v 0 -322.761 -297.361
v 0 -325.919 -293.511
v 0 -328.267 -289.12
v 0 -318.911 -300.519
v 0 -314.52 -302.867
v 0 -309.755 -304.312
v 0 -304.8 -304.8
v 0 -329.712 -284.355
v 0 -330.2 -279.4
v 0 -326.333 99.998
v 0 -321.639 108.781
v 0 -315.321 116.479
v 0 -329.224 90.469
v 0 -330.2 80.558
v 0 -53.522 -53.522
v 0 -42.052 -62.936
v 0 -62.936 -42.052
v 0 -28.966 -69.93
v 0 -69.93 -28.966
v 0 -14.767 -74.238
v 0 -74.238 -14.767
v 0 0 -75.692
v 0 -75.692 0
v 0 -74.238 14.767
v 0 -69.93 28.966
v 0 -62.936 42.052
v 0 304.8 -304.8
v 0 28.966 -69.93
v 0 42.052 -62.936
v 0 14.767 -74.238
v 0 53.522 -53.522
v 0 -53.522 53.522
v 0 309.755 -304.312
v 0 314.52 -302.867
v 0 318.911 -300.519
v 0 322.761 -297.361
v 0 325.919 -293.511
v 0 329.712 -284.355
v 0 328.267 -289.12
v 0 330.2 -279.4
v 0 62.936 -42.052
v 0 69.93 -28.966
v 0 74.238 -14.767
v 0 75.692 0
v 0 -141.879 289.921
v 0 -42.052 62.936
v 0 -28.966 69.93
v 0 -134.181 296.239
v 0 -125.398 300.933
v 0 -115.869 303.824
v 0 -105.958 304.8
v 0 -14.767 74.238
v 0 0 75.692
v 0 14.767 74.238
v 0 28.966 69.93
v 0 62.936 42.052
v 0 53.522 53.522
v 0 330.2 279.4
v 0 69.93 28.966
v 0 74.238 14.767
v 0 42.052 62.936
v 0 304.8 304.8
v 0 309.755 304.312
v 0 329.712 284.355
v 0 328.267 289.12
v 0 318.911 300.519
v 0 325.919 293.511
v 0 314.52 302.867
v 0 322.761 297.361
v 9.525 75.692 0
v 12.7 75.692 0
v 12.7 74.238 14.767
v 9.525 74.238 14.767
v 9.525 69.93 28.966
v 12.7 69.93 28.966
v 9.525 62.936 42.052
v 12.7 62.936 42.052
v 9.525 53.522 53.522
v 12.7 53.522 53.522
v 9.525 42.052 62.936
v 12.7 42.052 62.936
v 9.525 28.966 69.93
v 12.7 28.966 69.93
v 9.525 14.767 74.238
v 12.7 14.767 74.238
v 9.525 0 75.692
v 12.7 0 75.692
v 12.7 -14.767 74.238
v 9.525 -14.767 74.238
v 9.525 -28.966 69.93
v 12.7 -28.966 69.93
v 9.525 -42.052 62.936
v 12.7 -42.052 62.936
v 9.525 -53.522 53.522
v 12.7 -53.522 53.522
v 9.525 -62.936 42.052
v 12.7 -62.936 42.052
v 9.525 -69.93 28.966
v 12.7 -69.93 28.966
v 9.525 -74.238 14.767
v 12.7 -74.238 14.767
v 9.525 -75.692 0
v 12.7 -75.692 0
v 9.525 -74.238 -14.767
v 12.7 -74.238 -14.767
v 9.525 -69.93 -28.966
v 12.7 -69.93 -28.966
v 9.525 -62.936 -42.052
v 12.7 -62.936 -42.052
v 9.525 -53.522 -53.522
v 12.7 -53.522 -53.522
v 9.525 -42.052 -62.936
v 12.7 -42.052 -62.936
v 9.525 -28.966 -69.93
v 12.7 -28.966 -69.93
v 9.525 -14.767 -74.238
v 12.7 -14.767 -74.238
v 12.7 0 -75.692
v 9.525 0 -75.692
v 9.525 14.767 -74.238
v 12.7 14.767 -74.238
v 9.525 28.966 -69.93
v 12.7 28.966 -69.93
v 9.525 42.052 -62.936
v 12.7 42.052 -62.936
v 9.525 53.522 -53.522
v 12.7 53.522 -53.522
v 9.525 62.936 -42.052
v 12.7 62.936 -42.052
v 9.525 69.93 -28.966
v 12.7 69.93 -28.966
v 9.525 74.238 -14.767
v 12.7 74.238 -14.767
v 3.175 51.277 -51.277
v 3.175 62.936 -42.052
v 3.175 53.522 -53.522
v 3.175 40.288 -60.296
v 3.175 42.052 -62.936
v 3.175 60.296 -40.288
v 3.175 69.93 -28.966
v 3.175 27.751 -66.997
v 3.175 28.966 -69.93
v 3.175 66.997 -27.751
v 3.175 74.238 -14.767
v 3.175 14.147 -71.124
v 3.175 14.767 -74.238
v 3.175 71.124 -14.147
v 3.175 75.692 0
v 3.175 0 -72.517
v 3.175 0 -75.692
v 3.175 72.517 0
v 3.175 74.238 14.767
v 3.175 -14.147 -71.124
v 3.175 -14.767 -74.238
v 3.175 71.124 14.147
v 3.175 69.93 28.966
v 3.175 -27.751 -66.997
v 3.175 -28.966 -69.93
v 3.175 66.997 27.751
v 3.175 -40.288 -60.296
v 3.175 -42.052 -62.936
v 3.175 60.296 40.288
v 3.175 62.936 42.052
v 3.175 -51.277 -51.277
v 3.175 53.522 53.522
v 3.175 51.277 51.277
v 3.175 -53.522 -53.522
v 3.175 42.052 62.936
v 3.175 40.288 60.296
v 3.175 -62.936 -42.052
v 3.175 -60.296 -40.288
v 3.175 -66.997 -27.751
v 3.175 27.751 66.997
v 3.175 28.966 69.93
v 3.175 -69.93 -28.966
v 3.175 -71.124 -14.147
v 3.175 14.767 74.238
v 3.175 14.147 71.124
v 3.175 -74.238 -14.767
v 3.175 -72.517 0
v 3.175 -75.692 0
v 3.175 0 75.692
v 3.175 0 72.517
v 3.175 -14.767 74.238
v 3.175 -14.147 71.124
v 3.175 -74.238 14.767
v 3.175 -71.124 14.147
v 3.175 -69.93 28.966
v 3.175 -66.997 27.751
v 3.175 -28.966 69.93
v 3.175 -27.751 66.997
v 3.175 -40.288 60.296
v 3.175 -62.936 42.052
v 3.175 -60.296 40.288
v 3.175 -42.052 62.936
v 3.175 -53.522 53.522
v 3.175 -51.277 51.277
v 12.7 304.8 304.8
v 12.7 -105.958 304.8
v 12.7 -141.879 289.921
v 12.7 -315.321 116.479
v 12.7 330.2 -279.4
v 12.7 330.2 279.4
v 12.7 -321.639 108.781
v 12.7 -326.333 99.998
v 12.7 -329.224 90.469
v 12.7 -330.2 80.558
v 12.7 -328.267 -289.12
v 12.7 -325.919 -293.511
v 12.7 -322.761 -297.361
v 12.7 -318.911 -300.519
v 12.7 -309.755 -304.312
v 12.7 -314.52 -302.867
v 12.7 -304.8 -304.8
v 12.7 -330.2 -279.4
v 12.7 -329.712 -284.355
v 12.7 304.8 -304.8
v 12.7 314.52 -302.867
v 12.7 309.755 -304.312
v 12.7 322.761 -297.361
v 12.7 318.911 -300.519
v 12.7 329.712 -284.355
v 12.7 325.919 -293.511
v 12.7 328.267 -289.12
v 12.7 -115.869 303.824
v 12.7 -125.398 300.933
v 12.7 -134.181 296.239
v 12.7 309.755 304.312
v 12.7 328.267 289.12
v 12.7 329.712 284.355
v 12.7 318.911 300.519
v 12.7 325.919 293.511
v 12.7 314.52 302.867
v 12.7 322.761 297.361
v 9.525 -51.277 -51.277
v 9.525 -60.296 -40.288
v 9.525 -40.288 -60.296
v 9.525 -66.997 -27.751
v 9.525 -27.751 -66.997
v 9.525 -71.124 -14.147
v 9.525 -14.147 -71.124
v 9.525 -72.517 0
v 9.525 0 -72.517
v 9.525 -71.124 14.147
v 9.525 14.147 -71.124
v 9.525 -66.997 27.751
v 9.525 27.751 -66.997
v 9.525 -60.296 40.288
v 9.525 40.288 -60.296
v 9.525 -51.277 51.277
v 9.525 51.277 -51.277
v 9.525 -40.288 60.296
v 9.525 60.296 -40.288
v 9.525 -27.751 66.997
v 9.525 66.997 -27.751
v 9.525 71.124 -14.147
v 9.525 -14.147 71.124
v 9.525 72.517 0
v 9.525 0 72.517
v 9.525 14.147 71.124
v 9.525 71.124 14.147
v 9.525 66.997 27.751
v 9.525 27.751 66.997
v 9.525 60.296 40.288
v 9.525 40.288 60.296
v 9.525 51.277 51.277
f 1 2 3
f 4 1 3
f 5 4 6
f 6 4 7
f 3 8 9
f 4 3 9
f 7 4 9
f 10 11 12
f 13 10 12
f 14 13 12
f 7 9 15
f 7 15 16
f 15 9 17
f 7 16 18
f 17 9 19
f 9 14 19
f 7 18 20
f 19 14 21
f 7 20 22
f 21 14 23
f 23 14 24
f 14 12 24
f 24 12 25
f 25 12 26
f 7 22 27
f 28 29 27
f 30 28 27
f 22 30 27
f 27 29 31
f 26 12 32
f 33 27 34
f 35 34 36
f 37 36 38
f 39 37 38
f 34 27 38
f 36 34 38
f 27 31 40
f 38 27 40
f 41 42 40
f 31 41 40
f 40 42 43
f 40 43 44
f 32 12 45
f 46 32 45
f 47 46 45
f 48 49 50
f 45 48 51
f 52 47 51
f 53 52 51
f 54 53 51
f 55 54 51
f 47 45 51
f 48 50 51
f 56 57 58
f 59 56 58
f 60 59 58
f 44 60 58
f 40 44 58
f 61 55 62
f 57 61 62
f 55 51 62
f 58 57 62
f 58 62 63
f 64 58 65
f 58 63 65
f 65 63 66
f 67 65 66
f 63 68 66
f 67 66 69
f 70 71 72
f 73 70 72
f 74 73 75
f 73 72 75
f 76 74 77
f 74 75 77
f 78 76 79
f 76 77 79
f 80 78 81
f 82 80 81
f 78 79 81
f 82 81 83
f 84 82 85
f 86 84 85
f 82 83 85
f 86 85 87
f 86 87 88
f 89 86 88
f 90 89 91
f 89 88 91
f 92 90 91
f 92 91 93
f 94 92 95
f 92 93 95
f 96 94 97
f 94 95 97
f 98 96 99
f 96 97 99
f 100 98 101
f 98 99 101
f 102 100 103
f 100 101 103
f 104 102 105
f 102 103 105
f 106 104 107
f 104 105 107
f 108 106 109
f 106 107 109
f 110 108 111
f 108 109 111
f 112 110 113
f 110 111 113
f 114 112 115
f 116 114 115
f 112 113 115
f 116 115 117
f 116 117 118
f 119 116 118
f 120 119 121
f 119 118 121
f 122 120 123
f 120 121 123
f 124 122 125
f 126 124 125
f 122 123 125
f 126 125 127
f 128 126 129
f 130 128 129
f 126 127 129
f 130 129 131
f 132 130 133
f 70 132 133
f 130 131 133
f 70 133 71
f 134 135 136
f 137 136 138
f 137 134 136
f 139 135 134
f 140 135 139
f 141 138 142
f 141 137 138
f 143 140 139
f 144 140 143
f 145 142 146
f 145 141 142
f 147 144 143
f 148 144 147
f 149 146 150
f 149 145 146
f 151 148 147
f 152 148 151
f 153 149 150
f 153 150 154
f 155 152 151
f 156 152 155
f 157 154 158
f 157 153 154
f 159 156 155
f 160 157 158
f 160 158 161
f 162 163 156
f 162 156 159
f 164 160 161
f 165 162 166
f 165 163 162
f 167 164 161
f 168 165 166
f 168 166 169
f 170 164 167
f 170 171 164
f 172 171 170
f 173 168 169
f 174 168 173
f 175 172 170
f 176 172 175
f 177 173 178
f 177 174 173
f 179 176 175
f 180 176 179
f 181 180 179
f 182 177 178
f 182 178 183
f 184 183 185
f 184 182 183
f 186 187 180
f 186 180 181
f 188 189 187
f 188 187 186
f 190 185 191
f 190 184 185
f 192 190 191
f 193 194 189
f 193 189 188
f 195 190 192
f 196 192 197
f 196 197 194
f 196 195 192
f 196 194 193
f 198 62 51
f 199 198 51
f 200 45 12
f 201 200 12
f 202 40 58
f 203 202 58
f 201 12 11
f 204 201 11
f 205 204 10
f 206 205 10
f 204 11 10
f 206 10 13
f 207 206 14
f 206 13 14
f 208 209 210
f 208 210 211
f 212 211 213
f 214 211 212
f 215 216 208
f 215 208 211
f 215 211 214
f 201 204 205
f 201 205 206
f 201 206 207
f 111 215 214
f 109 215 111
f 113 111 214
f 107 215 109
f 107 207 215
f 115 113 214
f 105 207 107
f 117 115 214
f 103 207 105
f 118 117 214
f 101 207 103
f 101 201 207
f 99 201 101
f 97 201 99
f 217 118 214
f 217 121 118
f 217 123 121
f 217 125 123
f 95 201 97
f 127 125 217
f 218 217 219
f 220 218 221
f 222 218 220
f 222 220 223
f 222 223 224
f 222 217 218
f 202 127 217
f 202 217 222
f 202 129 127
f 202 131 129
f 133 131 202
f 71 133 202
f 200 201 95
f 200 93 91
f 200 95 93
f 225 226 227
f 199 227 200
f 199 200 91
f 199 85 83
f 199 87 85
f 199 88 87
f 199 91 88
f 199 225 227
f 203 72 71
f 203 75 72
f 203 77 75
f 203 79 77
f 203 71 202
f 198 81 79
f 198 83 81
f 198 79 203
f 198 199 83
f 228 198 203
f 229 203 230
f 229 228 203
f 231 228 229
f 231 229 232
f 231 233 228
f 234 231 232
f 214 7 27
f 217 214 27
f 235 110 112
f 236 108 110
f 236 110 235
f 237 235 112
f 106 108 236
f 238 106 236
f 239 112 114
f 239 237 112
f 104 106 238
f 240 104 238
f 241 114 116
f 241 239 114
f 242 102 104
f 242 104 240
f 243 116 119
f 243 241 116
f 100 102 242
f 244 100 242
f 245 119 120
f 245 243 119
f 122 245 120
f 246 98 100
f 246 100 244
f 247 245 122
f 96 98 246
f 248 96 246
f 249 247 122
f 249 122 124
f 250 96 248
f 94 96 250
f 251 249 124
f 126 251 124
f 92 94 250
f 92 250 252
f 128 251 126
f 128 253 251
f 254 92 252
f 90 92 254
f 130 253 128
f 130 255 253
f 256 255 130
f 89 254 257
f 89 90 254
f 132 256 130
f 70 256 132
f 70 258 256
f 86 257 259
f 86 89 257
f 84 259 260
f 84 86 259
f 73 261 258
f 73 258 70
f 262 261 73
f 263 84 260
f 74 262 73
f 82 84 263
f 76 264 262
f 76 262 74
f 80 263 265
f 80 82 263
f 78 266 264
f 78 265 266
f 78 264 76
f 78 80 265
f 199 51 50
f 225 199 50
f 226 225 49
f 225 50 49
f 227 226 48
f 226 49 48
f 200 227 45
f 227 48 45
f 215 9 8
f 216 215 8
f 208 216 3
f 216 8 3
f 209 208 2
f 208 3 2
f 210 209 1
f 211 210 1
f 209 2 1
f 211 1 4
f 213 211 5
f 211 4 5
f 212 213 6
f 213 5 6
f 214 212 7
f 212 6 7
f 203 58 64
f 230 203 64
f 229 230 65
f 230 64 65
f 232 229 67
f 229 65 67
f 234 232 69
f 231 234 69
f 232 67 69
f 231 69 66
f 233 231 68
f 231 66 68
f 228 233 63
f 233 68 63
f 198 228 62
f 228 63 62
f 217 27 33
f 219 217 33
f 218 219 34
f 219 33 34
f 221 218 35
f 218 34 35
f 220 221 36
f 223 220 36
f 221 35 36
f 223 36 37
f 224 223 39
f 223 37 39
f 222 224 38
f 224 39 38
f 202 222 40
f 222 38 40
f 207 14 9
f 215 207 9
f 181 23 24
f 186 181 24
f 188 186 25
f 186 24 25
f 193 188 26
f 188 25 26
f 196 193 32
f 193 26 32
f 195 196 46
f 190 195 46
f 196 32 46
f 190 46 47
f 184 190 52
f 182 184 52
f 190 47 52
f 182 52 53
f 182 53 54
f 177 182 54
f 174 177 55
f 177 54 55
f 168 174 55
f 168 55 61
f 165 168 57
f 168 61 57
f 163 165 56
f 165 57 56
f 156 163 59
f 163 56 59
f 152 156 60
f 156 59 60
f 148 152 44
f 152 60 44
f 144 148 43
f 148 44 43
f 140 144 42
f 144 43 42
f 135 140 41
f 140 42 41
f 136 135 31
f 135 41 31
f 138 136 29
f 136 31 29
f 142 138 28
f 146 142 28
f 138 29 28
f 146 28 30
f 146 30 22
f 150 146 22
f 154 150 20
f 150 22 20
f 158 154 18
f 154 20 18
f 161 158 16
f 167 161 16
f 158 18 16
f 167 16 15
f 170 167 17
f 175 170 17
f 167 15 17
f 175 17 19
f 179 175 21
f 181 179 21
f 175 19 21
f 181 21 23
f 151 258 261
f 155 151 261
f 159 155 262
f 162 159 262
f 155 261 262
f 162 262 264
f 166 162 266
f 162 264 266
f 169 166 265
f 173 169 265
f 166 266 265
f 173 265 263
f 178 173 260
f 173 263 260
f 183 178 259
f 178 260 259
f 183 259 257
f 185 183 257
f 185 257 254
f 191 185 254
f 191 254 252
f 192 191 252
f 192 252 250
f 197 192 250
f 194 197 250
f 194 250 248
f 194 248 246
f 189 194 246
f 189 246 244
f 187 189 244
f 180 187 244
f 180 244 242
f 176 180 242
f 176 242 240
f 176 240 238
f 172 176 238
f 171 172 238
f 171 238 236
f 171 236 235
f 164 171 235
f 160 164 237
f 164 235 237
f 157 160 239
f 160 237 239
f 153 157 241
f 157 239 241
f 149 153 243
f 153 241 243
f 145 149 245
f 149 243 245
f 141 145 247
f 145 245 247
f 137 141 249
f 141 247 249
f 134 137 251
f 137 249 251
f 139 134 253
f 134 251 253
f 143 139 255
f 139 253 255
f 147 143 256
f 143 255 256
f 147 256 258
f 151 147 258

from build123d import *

# Parameters (mm, degrees)
F1_DEPTH = 12.7
F2_R     = 72.517
F3_DEPTH = 12.701
F4_R     = 75.692
F5_DEPTH = 3.175
F6_R     = 75.692
F7_DEPTH = 3.175


with BuildPart() as f1:
    # F0 (on Right) → F1 (new body)
    with BuildSketch(Plane.YZ):
        with BuildLine():
            ThreePointArc((330.2, 279.4), (322.760512, 297.360512), (304.8, 304.8))
            Line((304.8, 304.8), (-105.957951, 304.8))
            ThreePointArc((-105.957951, 304.8), (-125.398269, 300.93308), (-141.878976, 289.921024))
            Line((-141.878976, 289.921024), (-315.321024, 116.478976))
            ThreePointArc((-315.321024, 116.478976), (-326.33308, 99.998269), (-330.2, 80.557951))
            Line((-330.2, 80.557951), (-330.2, -279.4))
            ThreePointArc((-330.2, -279.4), (-322.760512, -297.360512), (-304.8, -304.8))
            Line((-304.8, -304.8), (304.8, -304.8))
            ThreePointArc((304.8, -304.8), (322.760512, -297.360512), (330.2, -279.4))
            Line((330.2, -279.4), (330.2, 279.4))
        make_face()
    extrude(amount=F1_DEPTH)

    # F2 (on face) → F3 (cut, through all)
    with BuildSketch(Plane.YZ.offset(12.7)):
        Circle(F2_R)
    extrude(amount=-F3_DEPTH, mode=Mode.SUBTRACT)

    # F4 (on face) → F5 (cut)
    with BuildSketch(Plane.YZ.offset(12.7)):
        Circle(F4_R)
    extrude(amount=-F5_DEPTH, mode=Mode.SUBTRACT)

    # F6 (on face) → F7 (cut)
    with BuildSketch(Plane(origin=(0, 0, 0), x_dir=(0, -1, 0), z_dir=(-1, 0, 0))):
        Circle(F6_R)
    extrude(amount=-F7_DEPTH, mode=Mode.SUBTRACT)


solid = f1.part
